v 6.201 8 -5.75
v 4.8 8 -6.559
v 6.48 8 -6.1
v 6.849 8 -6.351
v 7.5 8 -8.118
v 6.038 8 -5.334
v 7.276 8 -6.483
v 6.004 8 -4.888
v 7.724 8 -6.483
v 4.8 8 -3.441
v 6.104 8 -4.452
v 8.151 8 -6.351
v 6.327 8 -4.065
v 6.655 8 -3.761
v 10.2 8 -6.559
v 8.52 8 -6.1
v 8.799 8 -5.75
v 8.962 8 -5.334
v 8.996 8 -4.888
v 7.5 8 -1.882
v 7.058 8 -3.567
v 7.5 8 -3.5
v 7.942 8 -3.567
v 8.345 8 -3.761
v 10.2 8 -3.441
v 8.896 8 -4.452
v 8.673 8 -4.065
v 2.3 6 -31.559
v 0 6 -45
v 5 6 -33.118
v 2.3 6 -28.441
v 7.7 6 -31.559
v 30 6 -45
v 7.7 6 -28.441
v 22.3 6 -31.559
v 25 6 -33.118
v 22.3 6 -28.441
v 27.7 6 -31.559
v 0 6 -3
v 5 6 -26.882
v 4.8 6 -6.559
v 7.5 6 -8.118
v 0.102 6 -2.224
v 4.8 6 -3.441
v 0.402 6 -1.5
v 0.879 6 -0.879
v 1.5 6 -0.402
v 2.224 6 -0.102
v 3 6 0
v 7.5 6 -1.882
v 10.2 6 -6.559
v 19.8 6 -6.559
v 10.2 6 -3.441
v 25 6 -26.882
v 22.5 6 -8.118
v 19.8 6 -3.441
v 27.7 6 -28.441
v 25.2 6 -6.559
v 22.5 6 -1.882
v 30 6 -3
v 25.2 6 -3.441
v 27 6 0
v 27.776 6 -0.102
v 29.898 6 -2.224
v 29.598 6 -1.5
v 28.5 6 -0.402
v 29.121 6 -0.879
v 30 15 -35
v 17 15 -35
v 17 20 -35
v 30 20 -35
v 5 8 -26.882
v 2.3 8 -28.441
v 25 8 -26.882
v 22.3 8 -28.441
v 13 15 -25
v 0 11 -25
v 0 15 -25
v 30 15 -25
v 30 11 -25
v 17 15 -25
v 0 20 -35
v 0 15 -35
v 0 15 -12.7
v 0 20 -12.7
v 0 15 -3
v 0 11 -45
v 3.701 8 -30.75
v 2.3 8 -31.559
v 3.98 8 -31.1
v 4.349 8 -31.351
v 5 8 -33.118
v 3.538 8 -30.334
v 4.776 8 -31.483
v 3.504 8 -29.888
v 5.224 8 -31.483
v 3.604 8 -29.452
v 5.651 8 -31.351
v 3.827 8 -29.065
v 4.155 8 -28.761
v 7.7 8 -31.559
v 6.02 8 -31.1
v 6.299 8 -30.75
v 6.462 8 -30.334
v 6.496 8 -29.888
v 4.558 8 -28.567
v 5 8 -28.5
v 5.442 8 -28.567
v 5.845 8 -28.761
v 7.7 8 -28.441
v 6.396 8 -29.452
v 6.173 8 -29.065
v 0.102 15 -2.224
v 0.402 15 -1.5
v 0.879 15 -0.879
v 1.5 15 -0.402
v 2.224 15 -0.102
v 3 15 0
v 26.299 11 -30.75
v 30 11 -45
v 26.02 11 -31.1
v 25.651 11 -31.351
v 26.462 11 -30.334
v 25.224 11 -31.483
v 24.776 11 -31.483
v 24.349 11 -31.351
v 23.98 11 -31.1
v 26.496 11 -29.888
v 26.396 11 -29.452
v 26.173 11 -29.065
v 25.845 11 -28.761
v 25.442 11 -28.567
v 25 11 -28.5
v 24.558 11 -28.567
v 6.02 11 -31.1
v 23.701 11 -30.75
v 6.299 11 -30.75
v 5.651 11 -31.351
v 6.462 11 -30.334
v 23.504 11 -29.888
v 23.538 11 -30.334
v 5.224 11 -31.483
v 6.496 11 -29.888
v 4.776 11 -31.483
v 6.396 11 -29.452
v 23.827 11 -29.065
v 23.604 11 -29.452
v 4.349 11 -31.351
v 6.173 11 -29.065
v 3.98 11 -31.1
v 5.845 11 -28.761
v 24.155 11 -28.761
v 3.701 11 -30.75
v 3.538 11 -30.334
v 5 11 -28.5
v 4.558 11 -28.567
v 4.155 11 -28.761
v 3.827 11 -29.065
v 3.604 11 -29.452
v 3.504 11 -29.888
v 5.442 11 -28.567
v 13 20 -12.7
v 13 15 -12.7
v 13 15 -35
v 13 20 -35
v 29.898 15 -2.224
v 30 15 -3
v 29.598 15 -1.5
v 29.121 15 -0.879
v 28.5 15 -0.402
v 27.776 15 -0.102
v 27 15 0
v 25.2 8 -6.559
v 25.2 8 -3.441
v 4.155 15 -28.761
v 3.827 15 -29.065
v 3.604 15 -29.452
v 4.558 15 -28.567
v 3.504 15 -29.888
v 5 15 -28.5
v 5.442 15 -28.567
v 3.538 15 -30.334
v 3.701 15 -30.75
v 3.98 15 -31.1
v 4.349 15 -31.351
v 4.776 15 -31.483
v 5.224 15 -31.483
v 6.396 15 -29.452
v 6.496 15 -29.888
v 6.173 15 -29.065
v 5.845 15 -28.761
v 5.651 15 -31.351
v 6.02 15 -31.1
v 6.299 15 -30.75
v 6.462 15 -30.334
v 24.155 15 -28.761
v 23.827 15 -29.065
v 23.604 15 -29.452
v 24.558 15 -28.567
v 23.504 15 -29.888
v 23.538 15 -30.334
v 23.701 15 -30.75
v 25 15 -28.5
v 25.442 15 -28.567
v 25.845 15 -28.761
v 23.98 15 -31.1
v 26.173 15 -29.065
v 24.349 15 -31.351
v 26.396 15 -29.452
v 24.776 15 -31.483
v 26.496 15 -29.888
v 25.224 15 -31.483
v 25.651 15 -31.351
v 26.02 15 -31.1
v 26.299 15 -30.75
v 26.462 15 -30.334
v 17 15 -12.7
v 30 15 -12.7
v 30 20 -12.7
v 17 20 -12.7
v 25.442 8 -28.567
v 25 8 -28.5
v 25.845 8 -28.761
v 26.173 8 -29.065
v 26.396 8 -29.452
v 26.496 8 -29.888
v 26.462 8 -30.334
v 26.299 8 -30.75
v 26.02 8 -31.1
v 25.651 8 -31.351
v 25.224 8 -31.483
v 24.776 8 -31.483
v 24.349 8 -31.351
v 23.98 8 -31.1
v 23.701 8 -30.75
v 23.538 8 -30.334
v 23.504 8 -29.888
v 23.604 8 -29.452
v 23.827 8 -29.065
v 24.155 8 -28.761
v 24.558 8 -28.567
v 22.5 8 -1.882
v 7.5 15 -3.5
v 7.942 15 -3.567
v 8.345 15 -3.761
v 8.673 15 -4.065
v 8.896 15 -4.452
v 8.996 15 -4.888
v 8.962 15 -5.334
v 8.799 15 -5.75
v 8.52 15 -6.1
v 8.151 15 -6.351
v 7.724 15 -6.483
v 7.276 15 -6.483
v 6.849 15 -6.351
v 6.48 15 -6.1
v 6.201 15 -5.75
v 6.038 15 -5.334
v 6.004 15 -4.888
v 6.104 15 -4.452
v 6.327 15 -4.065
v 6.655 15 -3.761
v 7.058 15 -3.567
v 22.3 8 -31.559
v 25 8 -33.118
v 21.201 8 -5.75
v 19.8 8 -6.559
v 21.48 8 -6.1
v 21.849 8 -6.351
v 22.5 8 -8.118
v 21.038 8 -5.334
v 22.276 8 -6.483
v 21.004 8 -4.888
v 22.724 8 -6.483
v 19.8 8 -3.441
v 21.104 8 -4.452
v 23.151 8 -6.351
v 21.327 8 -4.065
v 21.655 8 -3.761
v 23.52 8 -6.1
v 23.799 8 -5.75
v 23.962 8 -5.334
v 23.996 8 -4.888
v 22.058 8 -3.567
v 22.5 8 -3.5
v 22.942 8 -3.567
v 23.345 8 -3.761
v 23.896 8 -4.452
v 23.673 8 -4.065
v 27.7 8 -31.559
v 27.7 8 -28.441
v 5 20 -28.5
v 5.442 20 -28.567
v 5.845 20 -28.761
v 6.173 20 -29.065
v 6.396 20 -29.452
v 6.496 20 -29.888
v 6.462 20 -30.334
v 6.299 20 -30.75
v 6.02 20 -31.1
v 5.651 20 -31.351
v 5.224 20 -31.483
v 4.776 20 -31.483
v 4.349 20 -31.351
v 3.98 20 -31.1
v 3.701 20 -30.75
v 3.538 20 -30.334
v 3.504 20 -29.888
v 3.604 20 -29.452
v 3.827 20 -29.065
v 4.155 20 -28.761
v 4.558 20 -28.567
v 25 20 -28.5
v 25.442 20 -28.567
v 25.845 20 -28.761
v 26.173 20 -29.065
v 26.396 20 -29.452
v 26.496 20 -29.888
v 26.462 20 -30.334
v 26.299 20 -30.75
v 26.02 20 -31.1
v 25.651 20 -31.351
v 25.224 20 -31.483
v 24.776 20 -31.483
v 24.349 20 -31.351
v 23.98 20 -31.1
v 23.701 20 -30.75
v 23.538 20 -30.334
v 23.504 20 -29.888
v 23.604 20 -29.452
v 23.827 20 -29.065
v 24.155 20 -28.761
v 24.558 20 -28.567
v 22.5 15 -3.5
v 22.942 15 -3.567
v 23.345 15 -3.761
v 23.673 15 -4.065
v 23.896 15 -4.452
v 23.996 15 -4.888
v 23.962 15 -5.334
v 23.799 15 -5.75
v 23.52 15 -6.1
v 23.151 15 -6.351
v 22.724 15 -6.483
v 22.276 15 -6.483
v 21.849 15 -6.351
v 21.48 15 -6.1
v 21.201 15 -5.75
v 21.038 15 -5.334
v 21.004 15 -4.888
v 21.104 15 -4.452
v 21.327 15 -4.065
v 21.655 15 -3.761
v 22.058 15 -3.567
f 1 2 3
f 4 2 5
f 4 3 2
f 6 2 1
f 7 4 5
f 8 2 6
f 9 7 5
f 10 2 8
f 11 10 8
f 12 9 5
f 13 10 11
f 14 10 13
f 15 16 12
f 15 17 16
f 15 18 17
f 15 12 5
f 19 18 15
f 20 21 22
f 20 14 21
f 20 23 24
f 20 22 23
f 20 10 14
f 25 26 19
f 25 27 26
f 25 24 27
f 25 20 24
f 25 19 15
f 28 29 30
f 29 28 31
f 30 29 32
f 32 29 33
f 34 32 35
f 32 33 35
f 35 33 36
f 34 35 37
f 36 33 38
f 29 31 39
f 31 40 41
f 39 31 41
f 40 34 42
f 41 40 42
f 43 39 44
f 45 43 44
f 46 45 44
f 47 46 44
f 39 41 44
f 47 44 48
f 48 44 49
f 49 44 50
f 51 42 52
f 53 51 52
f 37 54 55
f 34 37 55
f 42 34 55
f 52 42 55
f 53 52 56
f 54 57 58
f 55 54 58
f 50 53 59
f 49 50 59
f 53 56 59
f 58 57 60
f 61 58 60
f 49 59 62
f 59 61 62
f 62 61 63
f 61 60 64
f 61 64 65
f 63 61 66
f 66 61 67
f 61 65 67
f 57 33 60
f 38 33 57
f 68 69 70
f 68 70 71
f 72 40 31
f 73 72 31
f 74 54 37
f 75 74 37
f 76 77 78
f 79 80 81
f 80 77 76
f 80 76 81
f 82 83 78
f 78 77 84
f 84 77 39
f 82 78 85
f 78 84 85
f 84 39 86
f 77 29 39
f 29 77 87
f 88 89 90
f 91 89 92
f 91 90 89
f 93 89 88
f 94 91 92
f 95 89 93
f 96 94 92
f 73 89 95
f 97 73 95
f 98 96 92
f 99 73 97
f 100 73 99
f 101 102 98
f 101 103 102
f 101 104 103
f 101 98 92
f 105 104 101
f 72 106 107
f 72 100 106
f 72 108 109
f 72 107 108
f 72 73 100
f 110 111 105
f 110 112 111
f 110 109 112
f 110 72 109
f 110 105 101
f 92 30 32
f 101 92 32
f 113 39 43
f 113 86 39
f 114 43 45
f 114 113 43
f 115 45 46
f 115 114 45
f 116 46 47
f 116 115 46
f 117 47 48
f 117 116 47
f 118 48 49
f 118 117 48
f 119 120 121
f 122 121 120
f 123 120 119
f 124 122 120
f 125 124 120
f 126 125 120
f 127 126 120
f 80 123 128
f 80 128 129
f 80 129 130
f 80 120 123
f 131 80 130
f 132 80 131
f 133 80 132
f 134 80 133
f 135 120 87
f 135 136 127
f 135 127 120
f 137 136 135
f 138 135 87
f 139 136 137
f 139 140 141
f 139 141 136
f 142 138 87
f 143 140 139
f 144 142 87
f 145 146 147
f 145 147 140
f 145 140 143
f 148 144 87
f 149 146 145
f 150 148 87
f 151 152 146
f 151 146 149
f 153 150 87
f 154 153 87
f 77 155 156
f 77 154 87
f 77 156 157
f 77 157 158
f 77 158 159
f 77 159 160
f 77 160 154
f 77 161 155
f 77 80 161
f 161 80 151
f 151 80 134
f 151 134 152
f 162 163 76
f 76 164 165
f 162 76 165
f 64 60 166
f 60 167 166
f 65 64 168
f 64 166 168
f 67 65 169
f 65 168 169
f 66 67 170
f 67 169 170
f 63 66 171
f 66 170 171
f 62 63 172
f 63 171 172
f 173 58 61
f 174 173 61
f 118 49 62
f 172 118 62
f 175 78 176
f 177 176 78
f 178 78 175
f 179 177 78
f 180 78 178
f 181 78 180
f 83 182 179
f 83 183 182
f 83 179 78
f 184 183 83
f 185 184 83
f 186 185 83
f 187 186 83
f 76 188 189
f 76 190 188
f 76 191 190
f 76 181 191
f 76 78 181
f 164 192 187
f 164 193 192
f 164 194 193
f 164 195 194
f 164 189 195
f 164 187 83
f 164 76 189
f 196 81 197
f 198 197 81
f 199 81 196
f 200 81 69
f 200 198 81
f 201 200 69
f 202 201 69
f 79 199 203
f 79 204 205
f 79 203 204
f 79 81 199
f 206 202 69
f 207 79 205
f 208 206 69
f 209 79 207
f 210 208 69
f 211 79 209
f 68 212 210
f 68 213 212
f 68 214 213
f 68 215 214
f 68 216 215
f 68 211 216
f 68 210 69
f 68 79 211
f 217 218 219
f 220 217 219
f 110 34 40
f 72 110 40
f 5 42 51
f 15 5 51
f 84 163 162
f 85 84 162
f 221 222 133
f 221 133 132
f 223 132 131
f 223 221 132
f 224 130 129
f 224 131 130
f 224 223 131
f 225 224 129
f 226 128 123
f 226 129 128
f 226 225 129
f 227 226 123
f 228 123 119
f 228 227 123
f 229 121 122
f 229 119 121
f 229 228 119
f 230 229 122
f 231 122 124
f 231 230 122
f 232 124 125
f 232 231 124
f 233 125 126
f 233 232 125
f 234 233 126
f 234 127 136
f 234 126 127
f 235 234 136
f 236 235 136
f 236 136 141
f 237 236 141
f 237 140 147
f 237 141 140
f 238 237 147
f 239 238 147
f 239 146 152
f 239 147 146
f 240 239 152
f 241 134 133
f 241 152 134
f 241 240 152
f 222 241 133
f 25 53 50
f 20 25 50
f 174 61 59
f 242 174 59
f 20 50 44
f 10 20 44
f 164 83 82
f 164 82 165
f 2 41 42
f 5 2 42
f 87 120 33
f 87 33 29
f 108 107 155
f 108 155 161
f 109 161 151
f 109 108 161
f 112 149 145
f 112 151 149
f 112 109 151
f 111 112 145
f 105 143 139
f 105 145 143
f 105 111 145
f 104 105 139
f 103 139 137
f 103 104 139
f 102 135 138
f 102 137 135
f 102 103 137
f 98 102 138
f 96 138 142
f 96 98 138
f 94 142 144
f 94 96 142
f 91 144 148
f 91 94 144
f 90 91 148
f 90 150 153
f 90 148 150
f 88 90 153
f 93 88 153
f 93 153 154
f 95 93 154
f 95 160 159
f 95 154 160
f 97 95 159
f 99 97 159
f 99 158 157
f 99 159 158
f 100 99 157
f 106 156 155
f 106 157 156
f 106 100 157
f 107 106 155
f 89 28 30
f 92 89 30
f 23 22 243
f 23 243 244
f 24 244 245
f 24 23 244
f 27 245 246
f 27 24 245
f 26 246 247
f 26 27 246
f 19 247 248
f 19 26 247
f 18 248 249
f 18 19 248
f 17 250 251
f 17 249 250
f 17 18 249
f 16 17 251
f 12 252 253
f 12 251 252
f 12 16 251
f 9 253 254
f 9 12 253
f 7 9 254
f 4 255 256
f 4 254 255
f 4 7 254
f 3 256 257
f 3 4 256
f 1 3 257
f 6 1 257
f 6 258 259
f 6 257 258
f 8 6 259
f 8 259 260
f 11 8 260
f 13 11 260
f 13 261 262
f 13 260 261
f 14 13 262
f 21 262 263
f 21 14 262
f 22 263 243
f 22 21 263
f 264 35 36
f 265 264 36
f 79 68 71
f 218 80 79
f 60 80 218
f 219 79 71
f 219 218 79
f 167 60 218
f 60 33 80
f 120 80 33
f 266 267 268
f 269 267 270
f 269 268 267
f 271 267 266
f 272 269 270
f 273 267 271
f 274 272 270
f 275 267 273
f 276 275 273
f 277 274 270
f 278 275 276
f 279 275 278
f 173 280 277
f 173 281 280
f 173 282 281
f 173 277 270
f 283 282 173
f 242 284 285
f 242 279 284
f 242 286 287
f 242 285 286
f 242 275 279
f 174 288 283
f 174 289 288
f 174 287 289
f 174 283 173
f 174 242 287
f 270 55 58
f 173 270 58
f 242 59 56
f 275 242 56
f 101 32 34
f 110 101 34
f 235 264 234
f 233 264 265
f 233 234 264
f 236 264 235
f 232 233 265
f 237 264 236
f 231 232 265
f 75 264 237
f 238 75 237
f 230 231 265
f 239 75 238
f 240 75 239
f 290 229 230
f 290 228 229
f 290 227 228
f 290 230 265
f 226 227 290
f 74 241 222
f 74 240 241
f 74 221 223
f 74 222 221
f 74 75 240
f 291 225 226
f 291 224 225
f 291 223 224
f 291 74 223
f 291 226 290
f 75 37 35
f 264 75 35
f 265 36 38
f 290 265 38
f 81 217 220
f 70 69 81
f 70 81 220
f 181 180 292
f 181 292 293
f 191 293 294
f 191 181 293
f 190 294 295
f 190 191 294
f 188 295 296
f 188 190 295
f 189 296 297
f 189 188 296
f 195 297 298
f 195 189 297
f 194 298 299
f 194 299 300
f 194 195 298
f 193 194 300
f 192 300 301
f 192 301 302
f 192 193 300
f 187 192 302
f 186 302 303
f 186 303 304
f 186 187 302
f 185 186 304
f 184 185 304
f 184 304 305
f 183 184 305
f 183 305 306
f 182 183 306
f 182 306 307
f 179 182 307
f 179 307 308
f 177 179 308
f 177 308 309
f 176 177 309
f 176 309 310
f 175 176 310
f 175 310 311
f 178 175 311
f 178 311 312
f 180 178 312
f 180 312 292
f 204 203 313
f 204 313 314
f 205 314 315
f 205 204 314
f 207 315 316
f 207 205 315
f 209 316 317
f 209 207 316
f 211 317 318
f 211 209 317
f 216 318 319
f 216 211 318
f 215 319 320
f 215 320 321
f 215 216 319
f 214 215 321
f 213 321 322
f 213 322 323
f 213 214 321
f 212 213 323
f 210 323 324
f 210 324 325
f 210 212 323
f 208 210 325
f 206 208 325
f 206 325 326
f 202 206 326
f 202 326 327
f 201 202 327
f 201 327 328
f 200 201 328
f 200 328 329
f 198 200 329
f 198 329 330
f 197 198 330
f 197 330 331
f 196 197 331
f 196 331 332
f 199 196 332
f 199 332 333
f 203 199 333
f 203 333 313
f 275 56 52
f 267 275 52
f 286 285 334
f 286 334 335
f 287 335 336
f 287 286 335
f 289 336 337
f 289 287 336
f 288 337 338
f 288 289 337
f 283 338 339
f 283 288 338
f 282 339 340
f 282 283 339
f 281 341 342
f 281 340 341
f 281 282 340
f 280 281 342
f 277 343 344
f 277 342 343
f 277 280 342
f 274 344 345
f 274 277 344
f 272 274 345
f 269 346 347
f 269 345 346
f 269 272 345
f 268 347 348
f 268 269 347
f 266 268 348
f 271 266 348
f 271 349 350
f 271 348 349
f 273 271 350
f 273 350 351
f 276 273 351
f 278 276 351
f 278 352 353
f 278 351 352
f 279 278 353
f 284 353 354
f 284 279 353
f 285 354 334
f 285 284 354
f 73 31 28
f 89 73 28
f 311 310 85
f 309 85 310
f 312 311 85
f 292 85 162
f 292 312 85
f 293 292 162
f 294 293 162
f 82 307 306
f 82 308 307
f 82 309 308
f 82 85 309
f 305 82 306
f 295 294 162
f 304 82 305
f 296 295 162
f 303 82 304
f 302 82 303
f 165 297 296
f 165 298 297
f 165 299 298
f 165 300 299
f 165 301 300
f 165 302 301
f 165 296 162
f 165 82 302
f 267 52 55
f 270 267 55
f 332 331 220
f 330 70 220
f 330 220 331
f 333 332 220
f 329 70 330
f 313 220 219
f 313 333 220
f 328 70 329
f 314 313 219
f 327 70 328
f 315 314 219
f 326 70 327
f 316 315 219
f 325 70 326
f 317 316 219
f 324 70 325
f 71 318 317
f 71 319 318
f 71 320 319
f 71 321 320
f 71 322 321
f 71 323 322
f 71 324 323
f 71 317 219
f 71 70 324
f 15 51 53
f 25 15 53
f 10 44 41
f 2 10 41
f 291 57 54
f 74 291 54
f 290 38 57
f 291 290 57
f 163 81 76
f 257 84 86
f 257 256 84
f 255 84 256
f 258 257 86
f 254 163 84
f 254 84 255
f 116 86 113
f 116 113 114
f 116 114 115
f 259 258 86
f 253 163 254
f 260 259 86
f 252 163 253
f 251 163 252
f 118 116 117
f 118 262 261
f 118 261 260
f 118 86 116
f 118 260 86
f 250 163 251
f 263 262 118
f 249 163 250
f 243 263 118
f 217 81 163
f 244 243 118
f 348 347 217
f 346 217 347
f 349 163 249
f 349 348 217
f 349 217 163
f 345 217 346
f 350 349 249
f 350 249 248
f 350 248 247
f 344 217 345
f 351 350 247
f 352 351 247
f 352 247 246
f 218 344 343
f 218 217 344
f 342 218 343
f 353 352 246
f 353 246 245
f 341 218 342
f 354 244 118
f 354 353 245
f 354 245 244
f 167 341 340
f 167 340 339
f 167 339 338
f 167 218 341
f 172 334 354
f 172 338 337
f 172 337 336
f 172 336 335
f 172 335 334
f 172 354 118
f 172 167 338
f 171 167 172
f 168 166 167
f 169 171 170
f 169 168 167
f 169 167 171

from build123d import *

# Parameters (mm, degrees)
CROQUIS1_W              = 30
CROQUIS1_H              = 35
CROQUIS1_R              = 1.5
SALIENTE_EXTRUIR1_DEPTH = 20
CROQUIS2_W              = 10
CROQUIS2_H              = 4
CORTAR_EXTRUIR1_DEPTH   = 41
CORTAR_EXTRUIR2_DEPTH   = 8
CORTAR_EXTRUIR3_DEPTH   = 8
CROQUIS6_W              = 30
CROQUIS6_H              = 11
SALIENTE_EXTRUIR2_DEPTH = 10
CORTAR_EXTRUIR4_START   = -30
CROQUIS7_W              = 45
CROQUIS7_H              = 6
CORTAR_EXTRUIR4_DEPTH   = 30
CORTAR_EXTRUIR5_REACH   = 52.249
CROQUIS8_W              = 4
CROQUIS8_H              = 5
CORTAR_EXTRUIR6_START   = -30
CROQUIS9_W              = 12.7
CROQUIS9_H              = 5
CORTAR_EXTRUIR6_DEPTH   = 30
REDONDEO1_R             = 3


with BuildPart() as part:
    # Croquis1 → Saliente-Extruir1 (new body)
    with BuildSketch(Plane(origin=(0, 0, 0), x_dir=(1, 0, 0), z_dir=(0, 1, 0))):
        with Locations((15, 17.5)):
            Rectangle(CROQUIS1_W, CROQUIS1_H)
        with Locations(Location((25, 30, 0), (0, 0, 270))):
            Circle(CROQUIS1_R, mode=Mode.SUBTRACT)
        with Locations(Location((5, 30, 0), (0, 0, 270))):
            Circle(CROQUIS1_R, mode=Mode.SUBTRACT)
        with Locations(Location((7.5, 5, 0), (0, 0, 270))):
            Circle(CROQUIS1_R, mode=Mode.SUBTRACT)
        with Locations(Location((22.5, 5, 0), (0, 0, 270))):
            Circle(CROQUIS1_R, mode=Mode.SUBTRACT)
    extrude(amount=SALIENTE_EXTRUIR1_DEPTH)

    # Croquis2 → Cortar-Extruir1 (cut)
    with BuildSketch(Plane(origin=(30, 0, 0), x_dir=(0, 0, -1), z_dir=(1, 0, 0))):
        with Locations((30, 13)):
            Rectangle(CROQUIS2_W, CROQUIS2_H)
    extrude(amount=-CORTAR_EXTRUIR1_DEPTH, mode=Mode.SUBTRACT)

    # Croquis3 → Cortar-Extruir2 (cut)
    with BuildSketch(Plane.XZ):
        Polygon((5, -33.117691454), (7.7, -31.558845727), (7.7, -28.441154273), (5, -26.882308546), (2.3, -28.441154273), (2.3, -31.558845727), align=None)
        Polygon((25, -33.117691454), (27.7, -31.558845727), (27.7, -28.441154273), (25, -26.882308546), (22.3, -28.441154273), (22.3, -31.558845727), align=None)
    extrude(amount=-CORTAR_EXTRUIR2_DEPTH, mode=Mode.SUBTRACT)

    # Croquis4 → Cortar-Extruir3 (cut)
    with BuildSketch(Plane.XZ):
        Polygon((7.5, -8.117691454), (10.2, -6.558845727), (10.2, -3.441154273), (7.5, -1.882308546), (4.8, -3.441154273), (4.8, -6.558845727), align=None)
        Polygon((22.5, -8.117691454), (25.2, -6.558845727), (25.2, -3.441154273), (22.5, -1.882308546), (19.8, -3.441154273), (19.8, -6.558845727), align=None)
    extrude(amount=-CORTAR_EXTRUIR3_DEPTH, mode=Mode.SUBTRACT)

    # Croquis6 → Saliente-Extruir2 (add)
    with BuildSketch(Plane(origin=(0, 0, -35), x_dir=(-1, 0, 0), z_dir=(0, 0, -1))):
        with Locations((-15, 5.5)):
            Rectangle(CROQUIS6_W, CROQUIS6_H)
    extrude(amount=SALIENTE_EXTRUIR2_DEPTH)

    # Croquis7 → Cortar-Extruir4 (cut)
    with BuildSketch(Plane.ZY.offset(CORTAR_EXTRUIR4_START)):
        with Locations((-22.5, 3)):
            Rectangle(CROQUIS7_W, CROQUIS7_H)
    extrude(amount=CORTAR_EXTRUIR4_DEPTH, mode=Mode.SUBTRACT)

    # Cortar-Extruir5: up to this face of the body (flat: up to its plane)
    cortar_extruir5_end = Plane(part.part.faces().sort_by_distance((15, 13, 0))[0])
    # Croquis8 → Cortar-Extruir5 (cut, up to the picked face)
    with BuildSketch(Plane(origin=(0, 0, -35), x_dir=(-1, 0, 0), z_dir=(0, 0, -1)), mode=Mode.PRIVATE) as cortar_extruir5_sk1:
        with Locations((-15, 17.5)):
            Rectangle(CROQUIS8_W, CROQUIS8_H)
    cortar_extruir5_tool1 = split(extrude(cortar_extruir5_sk1.sketch, amount=-CORTAR_EXTRUIR5_REACH, mode=Mode.PRIVATE), bisect_by=cortar_extruir5_end, keep=Keep.BOTH, mode=Mode.PRIVATE)
    add(cortar_extruir5_tool1.solids().sort_by(Axis((15, 17.5, -35), (0, 0, 1)))[0], mode=Mode.SUBTRACT)

    # Croquis9 → Cortar-Extruir6 (cut)
    with BuildSketch(Plane.ZY.offset(CORTAR_EXTRUIR6_START)):
        with Locations((-6.35, 17.5)):
            Rectangle(CROQUIS9_W, CROQUIS9_H)
    extrude(amount=CORTAR_EXTRUIR6_DEPTH, mode=Mode.SUBTRACT)

    # Redondeo1
    redondeo1_edges = [part.edges().sort_by_distance(p)[0] for p in [
        (30, 10.5, 0),
        (0, 10.5, 0),
    ]]
    fillet(redondeo1_edges, radius=REDONDEO1_R)


solid = part.part
